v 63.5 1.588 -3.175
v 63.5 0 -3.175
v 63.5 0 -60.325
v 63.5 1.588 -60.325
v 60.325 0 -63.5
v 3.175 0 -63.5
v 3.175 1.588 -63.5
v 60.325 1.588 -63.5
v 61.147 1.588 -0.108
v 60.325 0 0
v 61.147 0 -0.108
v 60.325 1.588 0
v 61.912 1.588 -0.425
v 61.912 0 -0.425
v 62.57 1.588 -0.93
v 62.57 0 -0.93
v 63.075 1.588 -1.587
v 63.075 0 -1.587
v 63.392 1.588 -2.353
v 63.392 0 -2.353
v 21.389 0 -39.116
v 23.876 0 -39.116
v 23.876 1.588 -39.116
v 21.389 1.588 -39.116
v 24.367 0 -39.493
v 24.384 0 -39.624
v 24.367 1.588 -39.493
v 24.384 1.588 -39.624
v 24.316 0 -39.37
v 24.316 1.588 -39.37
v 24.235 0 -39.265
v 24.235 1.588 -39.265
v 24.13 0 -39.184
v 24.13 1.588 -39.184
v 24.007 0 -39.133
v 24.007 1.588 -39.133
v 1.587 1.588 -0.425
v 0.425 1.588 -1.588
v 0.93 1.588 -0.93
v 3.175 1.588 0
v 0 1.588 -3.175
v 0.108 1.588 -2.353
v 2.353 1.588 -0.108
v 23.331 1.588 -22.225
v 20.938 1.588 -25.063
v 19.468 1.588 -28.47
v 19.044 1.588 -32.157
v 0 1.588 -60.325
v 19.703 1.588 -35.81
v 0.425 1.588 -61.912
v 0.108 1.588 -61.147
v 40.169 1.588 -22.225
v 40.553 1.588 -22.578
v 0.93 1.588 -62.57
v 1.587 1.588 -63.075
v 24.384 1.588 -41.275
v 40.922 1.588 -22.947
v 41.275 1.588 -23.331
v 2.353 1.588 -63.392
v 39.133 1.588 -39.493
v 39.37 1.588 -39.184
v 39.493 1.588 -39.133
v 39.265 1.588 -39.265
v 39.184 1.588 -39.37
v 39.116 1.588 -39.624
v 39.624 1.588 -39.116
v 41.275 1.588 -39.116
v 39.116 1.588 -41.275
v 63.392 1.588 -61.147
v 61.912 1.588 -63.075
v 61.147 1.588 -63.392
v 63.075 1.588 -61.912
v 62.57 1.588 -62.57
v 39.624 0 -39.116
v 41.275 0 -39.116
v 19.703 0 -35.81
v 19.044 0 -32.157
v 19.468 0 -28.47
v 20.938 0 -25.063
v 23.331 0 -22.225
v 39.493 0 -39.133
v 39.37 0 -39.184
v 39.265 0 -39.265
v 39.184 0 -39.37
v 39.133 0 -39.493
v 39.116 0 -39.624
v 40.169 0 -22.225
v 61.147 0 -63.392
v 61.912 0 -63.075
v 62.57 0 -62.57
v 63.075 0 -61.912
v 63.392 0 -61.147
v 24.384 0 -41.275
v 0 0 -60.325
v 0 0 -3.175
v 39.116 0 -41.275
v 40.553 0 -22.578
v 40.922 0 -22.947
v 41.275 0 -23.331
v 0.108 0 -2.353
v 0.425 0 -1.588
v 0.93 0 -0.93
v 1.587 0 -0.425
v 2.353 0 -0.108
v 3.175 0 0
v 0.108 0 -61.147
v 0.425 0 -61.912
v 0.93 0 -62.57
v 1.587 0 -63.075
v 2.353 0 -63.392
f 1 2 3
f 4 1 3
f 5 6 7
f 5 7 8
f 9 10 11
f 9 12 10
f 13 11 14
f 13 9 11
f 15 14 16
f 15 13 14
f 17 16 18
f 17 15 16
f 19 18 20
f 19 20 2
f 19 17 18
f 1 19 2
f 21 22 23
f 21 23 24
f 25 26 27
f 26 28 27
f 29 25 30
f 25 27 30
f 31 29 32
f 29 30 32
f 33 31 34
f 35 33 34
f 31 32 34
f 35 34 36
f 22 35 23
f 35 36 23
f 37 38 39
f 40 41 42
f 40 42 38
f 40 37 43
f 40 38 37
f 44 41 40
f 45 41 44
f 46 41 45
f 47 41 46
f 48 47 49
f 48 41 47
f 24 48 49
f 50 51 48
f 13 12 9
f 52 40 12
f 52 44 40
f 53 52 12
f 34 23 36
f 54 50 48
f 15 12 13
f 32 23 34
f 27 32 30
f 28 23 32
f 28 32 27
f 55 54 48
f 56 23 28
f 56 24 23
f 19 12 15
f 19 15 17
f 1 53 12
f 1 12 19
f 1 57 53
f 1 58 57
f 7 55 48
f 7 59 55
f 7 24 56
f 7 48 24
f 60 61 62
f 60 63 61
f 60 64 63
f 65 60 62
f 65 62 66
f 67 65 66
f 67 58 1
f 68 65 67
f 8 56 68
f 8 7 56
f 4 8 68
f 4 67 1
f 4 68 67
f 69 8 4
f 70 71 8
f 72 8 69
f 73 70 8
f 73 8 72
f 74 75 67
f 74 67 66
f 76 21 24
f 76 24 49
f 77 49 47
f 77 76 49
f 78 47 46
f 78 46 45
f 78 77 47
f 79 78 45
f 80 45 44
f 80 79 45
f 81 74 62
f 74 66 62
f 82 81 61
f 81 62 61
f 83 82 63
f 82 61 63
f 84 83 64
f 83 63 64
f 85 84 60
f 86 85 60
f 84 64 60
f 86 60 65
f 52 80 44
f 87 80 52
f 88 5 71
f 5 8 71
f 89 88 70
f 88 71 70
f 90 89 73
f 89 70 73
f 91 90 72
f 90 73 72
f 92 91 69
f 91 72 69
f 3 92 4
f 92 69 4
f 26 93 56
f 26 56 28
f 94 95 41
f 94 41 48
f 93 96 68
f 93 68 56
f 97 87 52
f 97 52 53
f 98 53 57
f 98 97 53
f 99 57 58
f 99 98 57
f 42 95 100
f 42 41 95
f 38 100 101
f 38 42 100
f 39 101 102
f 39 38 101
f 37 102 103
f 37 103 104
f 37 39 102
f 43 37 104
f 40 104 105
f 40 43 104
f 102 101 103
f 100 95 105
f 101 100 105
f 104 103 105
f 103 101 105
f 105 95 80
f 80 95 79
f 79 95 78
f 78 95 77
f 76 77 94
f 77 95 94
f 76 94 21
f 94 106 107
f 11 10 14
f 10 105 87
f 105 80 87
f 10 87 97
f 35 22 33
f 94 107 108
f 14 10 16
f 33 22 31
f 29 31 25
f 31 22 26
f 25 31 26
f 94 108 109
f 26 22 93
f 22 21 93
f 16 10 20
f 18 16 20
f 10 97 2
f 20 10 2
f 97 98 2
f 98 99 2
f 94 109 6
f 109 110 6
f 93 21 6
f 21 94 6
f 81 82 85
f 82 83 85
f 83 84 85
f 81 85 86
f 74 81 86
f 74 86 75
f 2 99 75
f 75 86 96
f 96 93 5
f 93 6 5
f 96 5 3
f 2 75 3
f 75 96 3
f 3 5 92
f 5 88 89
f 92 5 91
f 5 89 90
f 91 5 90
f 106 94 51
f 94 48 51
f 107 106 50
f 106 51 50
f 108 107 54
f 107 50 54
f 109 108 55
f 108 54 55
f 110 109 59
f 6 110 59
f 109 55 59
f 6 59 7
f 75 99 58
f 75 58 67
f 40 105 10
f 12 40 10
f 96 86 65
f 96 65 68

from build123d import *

# Parameters (mm, degrees)
SKETCH1_W           = 63.5
SKETCH1_H           = 63.5
BOSS_EXTRUDE1_DEPTH = 1.5875
FILLET1_R           = 0.508
FILLET2_R           = 3.175


with BuildPart() as part:
    # Sketch1 → Boss-Extrude1 (new body)
    with BuildSketch(Plane(origin=(0, 0, 0), x_dir=(1, 0, 0), z_dir=(0, 1, 0))):
        with Locations((31.75, 31.75)):
            Rectangle(SKETCH1_W, SKETCH1_H)
        with BuildLine():
            Line((24.384, 41.275), (24.384, 39.116))
            Line((24.384, 39.116), (21.388784565, 39.116))
            ThreePointArc((21.388784565, 39.116), (19.120478769, 30.298127151), (23.330551307, 22.225))
            Line((23.330551307, 22.225), (40.169448693, 22.225))
            ThreePointArc((40.169448693, 22.225), (40.739236377, 22.760763623), (41.275, 23.330551307))
            Line((41.275, 23.330551307), (41.275, 39.116))
            Line((41.275, 39.116), (39.116, 39.116))
            Line((39.116, 39.116), (39.116, 41.275))
            Line((39.116, 41.275), (24.384, 41.275))
        make_face(mode=Mode.SUBTRACT)
    extrude(amount=BOSS_EXTRUDE1_DEPTH)

    # Fillet1
    fillet1_edges = [part.edges().sort_by_distance(p)[0] for p in [
        (39.116, 0.79375, -39.116),
        (24.384, 0.79375, -39.116),
    ]]
    fillet(fillet1_edges, radius=FILLET1_R)

    # Fillet2
    fillet2_edges = [part.edges().sort_by_distance(p)[0] for p in [
        (0, 0.79375, -63.5),
        (63.5, 0.79375, -63.5),
        (63.5, 0.79375, 0),
        (0, 0.79375, 0),
    ]]
    fillet(fillet2_edges, radius=FILLET2_R)


solid = part.part
